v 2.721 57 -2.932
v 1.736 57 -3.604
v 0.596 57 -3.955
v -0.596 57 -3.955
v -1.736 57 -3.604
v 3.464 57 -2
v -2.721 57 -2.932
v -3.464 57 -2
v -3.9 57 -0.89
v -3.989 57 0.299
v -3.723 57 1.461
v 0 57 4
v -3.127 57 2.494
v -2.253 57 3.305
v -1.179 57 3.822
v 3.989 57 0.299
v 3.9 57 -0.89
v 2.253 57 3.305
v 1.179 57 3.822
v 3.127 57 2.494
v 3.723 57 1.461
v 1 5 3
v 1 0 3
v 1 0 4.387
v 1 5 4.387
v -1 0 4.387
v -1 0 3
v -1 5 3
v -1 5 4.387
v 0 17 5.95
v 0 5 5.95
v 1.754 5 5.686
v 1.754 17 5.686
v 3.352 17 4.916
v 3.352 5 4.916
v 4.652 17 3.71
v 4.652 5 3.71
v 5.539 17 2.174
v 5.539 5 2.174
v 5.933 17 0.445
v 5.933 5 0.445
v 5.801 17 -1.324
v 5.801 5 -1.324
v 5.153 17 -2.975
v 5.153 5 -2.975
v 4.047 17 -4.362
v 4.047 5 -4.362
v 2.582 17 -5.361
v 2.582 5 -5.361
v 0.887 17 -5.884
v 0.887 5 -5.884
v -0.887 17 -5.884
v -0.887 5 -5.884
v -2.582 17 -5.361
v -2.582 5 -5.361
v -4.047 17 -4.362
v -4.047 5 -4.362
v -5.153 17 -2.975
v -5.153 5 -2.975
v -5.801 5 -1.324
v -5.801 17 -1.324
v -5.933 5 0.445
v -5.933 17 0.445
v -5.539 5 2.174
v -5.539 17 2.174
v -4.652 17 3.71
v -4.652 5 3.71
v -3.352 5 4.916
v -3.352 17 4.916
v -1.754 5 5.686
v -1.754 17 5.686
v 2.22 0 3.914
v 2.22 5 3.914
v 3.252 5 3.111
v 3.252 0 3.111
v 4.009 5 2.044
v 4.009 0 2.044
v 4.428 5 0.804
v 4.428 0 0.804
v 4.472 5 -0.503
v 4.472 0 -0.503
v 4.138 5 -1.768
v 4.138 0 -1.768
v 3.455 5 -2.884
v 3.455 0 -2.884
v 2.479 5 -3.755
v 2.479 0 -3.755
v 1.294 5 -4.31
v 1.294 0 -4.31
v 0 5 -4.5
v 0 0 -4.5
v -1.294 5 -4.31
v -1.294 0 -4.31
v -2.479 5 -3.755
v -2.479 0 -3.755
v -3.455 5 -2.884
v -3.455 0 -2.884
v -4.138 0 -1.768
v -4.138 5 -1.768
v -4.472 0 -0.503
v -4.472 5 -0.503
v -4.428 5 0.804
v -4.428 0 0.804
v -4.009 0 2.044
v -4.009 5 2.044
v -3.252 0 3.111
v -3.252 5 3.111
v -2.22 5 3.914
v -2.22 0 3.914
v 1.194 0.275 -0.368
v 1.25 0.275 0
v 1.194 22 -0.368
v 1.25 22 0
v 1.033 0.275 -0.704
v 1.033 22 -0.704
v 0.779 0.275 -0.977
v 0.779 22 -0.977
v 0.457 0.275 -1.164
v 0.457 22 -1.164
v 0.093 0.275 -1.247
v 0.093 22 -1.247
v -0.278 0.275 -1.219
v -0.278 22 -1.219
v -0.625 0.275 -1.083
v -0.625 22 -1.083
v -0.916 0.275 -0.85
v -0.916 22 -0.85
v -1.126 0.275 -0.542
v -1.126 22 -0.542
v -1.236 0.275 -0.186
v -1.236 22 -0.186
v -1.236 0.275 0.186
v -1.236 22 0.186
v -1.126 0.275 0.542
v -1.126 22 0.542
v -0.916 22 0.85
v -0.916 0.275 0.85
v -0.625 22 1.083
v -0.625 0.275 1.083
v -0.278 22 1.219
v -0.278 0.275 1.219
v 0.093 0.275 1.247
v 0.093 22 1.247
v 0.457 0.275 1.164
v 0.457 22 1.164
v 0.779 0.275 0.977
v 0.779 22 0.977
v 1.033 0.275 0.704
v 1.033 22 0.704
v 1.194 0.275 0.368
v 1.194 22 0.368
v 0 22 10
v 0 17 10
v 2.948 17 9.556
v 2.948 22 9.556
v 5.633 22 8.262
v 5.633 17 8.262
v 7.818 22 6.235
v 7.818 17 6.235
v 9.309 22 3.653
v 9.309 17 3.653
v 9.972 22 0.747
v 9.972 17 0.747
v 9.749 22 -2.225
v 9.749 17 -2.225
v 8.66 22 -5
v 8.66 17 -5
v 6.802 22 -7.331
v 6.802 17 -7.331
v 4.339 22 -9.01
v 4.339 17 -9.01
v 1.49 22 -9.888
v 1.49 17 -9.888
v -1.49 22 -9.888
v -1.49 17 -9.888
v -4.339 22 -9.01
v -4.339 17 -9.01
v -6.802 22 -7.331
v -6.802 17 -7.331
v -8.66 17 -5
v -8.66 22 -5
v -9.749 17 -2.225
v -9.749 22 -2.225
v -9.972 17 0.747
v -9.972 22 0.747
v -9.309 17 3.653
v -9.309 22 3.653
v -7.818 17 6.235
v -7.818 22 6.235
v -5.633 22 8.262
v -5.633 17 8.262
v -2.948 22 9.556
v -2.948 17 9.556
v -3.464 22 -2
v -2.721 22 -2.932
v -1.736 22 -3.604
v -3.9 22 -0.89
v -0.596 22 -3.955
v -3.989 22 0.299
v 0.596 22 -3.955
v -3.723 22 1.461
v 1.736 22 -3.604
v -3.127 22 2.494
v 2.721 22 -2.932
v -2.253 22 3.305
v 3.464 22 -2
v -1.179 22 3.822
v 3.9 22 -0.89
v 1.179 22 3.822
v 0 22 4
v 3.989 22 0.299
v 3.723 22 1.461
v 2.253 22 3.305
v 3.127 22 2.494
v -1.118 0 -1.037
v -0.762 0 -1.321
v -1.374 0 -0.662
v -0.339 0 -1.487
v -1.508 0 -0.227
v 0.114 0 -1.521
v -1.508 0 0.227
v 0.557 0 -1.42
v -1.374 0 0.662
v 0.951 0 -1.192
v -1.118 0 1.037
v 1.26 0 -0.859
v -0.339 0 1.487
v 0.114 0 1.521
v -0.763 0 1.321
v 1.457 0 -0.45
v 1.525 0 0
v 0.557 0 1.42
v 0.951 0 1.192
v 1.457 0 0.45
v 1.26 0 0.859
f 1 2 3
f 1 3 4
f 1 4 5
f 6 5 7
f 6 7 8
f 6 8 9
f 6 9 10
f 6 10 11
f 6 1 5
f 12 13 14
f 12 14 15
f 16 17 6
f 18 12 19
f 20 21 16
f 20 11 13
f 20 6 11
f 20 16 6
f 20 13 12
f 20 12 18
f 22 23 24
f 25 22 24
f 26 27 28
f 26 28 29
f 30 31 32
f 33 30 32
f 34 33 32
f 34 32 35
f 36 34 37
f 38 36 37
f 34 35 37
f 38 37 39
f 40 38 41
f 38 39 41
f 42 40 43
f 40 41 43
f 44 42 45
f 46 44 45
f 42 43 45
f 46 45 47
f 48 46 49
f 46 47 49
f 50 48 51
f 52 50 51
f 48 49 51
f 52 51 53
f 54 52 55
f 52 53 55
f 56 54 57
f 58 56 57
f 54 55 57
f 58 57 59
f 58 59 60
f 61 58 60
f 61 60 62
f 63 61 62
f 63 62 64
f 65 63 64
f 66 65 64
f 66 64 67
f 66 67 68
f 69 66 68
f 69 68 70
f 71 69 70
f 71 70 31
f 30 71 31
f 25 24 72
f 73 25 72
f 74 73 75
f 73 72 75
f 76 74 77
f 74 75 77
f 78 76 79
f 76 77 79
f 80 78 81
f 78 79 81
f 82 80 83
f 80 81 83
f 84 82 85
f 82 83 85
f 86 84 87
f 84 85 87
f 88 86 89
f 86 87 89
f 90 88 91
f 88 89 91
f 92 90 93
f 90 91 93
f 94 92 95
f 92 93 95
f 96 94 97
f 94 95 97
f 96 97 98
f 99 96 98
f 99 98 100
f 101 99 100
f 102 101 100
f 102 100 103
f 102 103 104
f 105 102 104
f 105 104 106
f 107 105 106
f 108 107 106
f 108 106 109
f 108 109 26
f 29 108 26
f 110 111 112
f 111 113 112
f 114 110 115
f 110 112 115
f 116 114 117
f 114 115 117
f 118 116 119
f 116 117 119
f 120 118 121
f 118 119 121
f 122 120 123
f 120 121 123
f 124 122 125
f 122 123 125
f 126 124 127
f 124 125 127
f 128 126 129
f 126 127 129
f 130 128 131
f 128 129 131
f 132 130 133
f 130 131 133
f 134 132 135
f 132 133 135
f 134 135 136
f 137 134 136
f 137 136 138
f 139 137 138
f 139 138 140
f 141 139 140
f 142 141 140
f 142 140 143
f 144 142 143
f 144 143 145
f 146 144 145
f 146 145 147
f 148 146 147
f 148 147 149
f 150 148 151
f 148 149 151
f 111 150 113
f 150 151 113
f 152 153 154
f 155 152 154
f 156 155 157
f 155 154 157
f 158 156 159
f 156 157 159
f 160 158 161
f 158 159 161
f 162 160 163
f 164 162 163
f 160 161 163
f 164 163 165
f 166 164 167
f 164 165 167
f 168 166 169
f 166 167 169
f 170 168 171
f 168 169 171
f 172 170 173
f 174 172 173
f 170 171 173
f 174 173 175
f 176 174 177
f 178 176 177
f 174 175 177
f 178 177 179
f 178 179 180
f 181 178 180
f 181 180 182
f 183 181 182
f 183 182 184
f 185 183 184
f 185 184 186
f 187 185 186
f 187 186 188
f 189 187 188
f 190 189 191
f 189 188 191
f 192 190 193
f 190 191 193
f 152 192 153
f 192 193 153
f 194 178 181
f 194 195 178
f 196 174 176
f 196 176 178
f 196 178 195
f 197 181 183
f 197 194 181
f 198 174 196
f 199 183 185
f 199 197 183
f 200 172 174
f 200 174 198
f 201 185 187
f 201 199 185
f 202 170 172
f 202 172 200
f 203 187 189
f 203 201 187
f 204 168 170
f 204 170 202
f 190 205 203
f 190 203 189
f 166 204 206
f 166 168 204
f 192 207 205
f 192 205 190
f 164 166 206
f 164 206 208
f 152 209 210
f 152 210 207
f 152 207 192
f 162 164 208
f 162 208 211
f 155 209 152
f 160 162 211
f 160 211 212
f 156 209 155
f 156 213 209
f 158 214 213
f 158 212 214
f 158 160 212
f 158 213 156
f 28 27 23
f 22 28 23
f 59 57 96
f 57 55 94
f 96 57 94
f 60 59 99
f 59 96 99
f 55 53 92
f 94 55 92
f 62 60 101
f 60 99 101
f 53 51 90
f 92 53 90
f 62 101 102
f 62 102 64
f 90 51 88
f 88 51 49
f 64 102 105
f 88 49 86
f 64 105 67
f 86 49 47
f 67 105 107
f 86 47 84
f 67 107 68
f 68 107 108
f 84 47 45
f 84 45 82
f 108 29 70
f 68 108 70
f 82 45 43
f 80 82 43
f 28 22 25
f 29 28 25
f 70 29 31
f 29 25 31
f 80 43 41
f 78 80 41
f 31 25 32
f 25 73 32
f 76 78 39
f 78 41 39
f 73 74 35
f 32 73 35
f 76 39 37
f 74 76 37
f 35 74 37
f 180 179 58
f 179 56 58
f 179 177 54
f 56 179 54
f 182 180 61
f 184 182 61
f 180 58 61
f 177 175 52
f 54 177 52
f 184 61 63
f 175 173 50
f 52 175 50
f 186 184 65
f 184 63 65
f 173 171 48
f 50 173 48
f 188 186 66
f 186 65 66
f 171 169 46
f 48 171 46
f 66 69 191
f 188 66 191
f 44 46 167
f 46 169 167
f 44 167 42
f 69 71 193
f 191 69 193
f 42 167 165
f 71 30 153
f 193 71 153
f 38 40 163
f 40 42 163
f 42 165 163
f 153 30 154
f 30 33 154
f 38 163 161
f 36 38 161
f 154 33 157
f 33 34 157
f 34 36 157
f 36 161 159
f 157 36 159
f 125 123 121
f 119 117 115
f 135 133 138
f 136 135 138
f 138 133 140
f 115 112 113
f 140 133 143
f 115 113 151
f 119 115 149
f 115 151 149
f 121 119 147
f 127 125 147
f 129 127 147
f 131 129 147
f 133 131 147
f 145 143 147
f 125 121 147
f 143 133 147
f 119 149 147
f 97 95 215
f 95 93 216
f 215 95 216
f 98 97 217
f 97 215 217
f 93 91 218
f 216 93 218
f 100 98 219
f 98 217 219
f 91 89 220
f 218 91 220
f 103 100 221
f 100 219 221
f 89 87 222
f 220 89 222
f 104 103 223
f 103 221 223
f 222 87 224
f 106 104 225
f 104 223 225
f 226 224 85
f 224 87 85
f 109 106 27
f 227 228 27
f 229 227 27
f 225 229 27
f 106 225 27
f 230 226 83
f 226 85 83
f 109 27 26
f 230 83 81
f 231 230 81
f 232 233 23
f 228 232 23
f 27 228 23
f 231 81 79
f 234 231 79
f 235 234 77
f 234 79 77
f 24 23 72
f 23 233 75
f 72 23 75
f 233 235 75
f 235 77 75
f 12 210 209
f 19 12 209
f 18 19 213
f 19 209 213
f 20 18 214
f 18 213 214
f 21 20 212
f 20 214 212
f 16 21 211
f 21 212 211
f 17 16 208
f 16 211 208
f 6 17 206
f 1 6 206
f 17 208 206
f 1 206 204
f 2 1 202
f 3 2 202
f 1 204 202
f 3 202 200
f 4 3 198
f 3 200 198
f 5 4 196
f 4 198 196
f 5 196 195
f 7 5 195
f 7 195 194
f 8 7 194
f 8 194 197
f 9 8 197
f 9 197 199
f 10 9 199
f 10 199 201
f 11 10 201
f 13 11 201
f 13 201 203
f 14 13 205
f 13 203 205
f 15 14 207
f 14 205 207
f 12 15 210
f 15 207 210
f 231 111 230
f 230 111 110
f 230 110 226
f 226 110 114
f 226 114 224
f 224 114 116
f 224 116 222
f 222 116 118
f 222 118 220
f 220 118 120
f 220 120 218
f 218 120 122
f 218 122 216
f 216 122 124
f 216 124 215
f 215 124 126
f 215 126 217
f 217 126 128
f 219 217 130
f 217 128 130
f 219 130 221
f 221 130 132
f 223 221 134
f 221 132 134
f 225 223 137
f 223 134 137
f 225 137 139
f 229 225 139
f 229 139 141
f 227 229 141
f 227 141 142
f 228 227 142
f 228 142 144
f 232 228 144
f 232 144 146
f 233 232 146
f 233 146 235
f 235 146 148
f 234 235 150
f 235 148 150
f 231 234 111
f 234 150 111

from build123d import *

# Parameters (mm, degrees)
SKETCH2_R                   = 4.5
BOSS_EXTRUDE1_DEPTH         = 5
SKETCH3_R                   = 5.95
BOSS_EXTRUDE2_DEPTH         = 12
SKETCH4_R                   = 10
BOSS_EXTRUDE3_DEPTH         = 5
M3_TAPPED_HOLE1_D           = 2.5
M3_TAPPED_HOLE1_CSINK_D     = 3.05
M3_TAPPED_HOLE1_CSINK_ANGLE = 90
SKETCH11_W                  = 2
SKETCH11_H                  = 3
CUT_EXTRUDE2_DEPTH          = 5
SKETCH12_R                  = 4
BOSS_EXTRUDE5_DEPTH         = 35


with BuildPart() as part:
    # Sketch2 → Boss-Extrude1 (new body)
    with BuildSketch(Plane(origin=(0, 0, 0), x_dir=(1, 0, 0), z_dir=(0, 1, 0))):
        with Locations(Location((0, 0, 0), (0, 0, 270))):
            Circle(SKETCH2_R)
    extrude(amount=BOSS_EXTRUDE1_DEPTH)

    # Sketch3 → Boss-Extrude2 (add)
    with BuildSketch(Plane(origin=(0, 5, 0), x_dir=(1, 0, 0), z_dir=(0, 1, 0))):
        with Locations(Location((0, 0, 0), (0, 0, 270))):
            Circle(SKETCH3_R)
    extrude(amount=BOSS_EXTRUDE2_DEPTH)

    # Sketch4 → Boss-Extrude3 (add)
    with BuildSketch(Plane(origin=(0, 17, 0), x_dir=(1, 0, 0), z_dir=(0, 1, 0))):
        with Locations(Location((0, 0, 0), (0, 0, 270))):
            Circle(SKETCH4_R)
    extrude(amount=BOSS_EXTRUDE3_DEPTH)

    # M3 Tapped Hole1 (through all)
    with Locations(Plane(origin=(0, 0, 0), x_dir=(-1, 0, 0), z_dir=(0, -1, 0))):
        with Locations((0, 0)):
            CounterSinkHole(M3_TAPPED_HOLE1_D / 2, M3_TAPPED_HOLE1_CSINK_D / 2, counter_sink_angle=M3_TAPPED_HOLE1_CSINK_ANGLE)

    # Sketch11 → Cut-Extrude2 (cut)
    with BuildSketch(Plane.XZ):
        with Locations((0, 4.5)):
            Rectangle(SKETCH11_W, SKETCH11_H)
    extrude(amount=-CUT_EXTRUDE2_DEPTH, mode=Mode.SUBTRACT)

    # Sketch12 → Boss-Extrude5 (add)
    with BuildSketch(Plane(origin=(0, 22, 0), x_dir=(1, 0, 0), z_dir=(0, 1, 0))):
        with Locations(Location((0, 0, 0), (0, 0, 270))):
            Circle(SKETCH12_R)
    extrude(amount=BOSS_EXTRUDE5_DEPTH)


solid = part.part
